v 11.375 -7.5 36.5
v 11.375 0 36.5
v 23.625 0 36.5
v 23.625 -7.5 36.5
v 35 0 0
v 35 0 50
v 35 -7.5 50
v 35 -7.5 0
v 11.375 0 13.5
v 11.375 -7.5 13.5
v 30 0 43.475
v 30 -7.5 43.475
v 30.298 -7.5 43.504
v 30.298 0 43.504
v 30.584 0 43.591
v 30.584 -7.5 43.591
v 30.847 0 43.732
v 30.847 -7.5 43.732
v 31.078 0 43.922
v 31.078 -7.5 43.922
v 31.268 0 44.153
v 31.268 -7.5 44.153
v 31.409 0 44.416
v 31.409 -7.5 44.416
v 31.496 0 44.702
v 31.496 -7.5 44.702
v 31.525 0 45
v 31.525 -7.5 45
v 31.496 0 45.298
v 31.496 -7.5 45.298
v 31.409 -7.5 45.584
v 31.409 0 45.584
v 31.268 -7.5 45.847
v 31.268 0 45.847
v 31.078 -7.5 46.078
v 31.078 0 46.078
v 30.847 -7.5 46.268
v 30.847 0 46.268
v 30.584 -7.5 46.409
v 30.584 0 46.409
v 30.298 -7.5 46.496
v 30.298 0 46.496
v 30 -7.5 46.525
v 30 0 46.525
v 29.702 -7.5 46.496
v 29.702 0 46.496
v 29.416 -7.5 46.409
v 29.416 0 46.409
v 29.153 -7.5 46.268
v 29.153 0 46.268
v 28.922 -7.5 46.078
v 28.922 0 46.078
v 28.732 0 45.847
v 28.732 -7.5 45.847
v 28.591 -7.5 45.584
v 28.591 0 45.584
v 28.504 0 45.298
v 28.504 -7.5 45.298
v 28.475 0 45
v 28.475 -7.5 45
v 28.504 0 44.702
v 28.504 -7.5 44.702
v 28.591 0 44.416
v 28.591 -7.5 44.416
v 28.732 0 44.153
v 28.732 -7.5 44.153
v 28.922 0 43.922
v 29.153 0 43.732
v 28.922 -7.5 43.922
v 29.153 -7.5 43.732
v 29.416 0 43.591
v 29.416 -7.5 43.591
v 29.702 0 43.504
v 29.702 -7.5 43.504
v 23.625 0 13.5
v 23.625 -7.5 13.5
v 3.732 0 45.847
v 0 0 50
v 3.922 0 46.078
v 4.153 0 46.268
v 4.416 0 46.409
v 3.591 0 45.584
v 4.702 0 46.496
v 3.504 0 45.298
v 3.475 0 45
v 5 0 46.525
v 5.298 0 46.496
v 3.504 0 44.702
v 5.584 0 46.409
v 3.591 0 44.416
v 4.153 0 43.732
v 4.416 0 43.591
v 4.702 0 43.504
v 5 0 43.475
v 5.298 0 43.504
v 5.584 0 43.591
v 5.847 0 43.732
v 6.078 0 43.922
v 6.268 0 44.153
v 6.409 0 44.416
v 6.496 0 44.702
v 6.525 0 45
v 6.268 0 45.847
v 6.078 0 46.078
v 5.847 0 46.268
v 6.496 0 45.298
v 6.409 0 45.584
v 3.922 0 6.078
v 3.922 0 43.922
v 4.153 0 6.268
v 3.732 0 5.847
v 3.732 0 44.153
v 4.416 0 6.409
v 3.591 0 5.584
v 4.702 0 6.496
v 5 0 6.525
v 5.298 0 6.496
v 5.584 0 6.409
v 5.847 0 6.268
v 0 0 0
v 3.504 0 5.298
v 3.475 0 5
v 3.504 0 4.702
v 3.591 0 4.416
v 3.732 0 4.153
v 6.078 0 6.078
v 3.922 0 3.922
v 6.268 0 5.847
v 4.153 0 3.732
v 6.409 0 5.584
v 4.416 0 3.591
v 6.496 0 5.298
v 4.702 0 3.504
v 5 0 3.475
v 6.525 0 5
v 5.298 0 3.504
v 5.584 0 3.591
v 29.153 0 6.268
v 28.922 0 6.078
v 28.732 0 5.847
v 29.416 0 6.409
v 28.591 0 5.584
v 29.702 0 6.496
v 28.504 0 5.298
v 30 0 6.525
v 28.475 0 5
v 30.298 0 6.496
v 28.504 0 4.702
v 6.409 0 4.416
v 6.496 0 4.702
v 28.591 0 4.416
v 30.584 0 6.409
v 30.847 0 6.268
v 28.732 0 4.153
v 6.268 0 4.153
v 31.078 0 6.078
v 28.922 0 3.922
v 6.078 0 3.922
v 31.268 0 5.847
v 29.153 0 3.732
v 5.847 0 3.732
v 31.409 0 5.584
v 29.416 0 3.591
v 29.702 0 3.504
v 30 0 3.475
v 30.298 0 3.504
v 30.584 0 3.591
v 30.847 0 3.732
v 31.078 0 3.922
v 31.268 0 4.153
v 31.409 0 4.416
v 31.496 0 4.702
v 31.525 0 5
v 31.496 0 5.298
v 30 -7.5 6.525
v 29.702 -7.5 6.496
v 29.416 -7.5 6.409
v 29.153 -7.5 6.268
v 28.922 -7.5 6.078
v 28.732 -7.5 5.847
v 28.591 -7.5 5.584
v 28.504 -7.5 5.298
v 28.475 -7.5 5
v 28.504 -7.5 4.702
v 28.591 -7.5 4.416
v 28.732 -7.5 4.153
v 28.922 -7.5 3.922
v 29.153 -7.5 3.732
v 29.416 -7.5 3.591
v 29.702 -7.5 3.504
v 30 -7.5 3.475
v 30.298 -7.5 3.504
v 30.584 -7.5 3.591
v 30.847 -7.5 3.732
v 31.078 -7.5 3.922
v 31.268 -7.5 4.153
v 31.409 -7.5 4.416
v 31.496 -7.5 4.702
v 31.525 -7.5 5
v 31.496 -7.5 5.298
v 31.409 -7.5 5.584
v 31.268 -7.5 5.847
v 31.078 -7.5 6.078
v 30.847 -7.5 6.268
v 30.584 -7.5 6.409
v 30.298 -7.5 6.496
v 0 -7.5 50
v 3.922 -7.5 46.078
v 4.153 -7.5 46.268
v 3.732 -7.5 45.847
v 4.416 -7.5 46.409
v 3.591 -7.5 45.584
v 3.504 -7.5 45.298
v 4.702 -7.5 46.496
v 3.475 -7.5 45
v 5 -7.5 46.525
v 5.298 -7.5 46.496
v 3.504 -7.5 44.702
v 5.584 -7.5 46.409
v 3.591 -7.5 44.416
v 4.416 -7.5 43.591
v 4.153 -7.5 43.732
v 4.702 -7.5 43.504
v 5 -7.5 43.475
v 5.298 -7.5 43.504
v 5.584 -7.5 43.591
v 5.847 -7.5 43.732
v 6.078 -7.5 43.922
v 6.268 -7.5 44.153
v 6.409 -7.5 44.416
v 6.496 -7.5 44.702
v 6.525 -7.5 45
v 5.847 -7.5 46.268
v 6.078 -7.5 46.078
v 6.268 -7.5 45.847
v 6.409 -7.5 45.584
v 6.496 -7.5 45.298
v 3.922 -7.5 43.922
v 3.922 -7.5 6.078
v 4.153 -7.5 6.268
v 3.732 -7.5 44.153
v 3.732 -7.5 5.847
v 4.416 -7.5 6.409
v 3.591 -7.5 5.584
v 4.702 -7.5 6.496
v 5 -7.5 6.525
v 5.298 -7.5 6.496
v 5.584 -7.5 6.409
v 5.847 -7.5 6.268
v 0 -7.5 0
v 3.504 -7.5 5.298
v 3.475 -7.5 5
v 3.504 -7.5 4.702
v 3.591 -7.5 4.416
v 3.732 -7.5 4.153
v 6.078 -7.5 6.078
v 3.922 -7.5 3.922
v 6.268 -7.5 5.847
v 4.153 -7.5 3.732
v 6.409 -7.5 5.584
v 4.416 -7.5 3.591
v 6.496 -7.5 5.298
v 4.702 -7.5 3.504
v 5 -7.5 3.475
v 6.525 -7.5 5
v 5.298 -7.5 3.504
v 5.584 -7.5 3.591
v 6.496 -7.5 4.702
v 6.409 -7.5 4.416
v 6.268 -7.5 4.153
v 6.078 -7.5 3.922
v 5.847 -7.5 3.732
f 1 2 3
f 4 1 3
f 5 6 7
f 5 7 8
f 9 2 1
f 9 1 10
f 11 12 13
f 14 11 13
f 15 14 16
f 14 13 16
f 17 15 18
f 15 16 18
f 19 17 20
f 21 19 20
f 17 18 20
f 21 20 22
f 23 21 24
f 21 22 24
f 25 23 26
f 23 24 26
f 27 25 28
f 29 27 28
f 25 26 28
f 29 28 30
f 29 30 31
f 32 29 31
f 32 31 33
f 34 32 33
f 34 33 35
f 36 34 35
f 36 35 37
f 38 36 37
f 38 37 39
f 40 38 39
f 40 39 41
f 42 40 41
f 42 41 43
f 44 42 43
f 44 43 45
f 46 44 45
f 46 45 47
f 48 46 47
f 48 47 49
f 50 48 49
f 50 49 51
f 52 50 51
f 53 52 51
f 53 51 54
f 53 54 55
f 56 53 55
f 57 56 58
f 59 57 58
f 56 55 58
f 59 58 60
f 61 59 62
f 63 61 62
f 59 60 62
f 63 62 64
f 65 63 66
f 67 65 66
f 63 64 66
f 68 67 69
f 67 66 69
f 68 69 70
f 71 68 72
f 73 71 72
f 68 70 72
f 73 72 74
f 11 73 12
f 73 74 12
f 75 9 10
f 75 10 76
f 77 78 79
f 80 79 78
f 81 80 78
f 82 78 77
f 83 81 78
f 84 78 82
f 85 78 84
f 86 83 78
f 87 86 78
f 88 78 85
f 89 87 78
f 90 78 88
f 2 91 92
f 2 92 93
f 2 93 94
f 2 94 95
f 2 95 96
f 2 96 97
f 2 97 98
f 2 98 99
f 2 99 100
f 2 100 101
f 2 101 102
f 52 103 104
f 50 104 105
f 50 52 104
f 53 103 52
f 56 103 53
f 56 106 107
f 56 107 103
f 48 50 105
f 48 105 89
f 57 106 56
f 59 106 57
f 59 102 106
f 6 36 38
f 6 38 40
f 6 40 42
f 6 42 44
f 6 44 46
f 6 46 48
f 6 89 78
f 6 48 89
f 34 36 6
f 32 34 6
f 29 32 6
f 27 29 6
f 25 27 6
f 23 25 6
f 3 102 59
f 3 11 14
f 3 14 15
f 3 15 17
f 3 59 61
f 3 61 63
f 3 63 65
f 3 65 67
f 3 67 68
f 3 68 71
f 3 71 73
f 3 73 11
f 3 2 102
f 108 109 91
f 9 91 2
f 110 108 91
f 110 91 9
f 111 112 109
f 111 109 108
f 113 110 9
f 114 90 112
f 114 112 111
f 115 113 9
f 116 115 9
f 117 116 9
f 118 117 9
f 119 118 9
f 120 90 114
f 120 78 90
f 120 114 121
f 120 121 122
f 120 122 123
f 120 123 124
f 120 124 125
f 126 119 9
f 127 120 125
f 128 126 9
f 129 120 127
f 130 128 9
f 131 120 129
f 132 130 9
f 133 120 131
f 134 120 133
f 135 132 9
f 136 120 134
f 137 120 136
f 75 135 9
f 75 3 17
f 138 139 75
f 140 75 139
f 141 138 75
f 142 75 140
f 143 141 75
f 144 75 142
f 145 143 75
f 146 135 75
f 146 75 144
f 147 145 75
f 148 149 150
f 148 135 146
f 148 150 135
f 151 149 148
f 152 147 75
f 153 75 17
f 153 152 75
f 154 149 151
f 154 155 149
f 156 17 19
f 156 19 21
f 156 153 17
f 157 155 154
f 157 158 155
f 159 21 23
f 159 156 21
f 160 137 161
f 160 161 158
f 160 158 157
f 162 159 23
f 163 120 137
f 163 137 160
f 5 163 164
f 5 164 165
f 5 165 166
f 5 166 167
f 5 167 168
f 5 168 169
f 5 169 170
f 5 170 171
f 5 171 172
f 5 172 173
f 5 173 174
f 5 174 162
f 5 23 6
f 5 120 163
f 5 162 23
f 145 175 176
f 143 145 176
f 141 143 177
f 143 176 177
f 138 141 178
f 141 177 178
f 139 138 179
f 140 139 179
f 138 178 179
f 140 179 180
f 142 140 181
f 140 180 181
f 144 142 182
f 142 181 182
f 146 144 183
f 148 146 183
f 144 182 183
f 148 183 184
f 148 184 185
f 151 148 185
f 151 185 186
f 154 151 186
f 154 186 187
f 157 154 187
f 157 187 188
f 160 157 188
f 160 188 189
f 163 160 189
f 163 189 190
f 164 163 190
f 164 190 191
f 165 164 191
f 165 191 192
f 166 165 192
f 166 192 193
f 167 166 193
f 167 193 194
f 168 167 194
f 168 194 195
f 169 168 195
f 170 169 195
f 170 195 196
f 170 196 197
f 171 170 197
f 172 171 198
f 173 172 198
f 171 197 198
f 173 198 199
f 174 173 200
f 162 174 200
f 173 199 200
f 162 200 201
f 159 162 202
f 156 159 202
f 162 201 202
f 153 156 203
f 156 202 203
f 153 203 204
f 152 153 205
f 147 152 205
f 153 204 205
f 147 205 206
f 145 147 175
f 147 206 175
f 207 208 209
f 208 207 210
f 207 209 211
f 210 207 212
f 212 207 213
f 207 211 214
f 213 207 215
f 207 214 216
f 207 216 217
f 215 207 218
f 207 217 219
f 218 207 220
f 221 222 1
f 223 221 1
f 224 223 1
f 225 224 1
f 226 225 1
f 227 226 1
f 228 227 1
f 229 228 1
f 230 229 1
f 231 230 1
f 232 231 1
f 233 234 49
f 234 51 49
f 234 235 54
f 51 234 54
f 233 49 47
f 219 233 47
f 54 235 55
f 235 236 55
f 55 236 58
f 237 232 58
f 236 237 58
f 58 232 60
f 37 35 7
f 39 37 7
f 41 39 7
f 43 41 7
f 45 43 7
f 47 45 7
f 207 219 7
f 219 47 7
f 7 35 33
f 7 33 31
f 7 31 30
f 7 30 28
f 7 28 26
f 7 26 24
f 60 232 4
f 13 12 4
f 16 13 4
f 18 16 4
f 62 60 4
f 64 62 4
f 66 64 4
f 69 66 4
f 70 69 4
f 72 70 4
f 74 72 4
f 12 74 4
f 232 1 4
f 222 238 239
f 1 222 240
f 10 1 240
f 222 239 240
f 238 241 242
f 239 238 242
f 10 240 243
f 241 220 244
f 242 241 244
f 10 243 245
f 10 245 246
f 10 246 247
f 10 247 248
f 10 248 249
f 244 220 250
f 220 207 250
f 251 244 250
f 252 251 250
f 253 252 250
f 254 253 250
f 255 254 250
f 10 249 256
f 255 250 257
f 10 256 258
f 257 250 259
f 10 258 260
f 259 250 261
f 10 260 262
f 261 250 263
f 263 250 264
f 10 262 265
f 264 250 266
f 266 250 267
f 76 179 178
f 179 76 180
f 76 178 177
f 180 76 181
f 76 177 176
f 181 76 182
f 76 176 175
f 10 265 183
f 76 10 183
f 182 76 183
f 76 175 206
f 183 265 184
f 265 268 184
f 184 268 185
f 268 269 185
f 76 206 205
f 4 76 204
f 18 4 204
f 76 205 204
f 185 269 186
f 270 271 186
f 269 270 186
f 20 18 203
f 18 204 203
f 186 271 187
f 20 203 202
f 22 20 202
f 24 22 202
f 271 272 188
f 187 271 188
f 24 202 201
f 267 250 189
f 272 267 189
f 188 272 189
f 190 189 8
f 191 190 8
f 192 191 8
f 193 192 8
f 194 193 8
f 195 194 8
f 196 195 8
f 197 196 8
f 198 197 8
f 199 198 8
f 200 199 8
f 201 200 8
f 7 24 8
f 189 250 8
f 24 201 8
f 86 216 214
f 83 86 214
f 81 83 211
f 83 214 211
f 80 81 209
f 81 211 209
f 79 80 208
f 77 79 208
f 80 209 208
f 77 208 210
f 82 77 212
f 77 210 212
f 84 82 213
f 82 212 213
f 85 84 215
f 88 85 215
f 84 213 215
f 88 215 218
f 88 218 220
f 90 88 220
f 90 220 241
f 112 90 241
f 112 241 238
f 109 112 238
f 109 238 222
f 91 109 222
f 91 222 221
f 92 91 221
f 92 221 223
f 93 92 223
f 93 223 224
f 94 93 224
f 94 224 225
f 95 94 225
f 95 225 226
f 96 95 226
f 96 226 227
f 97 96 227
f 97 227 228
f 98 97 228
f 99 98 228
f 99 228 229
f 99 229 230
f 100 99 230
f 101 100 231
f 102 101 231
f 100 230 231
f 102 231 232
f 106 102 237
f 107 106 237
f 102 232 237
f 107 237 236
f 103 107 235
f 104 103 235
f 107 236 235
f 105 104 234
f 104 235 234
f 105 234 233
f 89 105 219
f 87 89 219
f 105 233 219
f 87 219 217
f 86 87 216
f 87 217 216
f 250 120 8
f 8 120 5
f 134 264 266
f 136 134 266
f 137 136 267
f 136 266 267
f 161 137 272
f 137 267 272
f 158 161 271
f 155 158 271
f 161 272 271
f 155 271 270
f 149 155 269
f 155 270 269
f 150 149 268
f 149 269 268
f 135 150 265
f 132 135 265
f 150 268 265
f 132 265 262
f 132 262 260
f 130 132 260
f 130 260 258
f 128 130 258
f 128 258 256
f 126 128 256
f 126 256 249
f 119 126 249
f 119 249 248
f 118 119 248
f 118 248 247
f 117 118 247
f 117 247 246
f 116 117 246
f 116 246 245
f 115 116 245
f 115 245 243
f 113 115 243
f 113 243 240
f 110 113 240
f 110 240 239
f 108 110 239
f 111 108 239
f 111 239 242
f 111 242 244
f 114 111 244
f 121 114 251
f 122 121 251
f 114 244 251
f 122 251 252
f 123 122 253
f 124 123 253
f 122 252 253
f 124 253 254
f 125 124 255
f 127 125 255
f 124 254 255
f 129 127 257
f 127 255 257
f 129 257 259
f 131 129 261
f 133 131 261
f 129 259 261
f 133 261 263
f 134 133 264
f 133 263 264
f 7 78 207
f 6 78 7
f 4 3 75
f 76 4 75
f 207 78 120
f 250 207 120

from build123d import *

# Parameters (mm, degrees)
SKETCH_1_W          = 35
SKETCH_1_H          = 50
SKETCH_1_W_2        = 12.25
SKETCH_1_H_2        = 23
EXTRUDE_2_DEPTH     = 7.5
SKETCH_2_R          = 1.525
CUT_EXTRUDE_1_DEPTH = 62.491869381


with BuildPart() as part:
    # 草图1 → 凸台-拉伸2 (new body)
    with BuildSketch(Plane(origin=(0, 0, 0), x_dir=(1, 0, 0), z_dir=(0, 1, 0))):
        with Locations((17.5, -25)):
            Rectangle(SKETCH_1_W, SKETCH_1_H)
        with Locations((17.5, -25)):
            Rectangle(SKETCH_1_W_2, SKETCH_1_H_2, mode=Mode.SUBTRACT)
    extrude(amount=-EXTRUDE_2_DEPTH)

    # 草图2 → 切除-拉伸1 (cut, through all)
    with BuildSketch(Plane.XZ.offset(7.5)):
        with Locations(Location((5, 5, 0), (0, 0, 270))):
            Circle(SKETCH_2_R)
        with Locations(Location((5, 45, 0), (0, 0, 90))):
            Circle(SKETCH_2_R)
        with Locations(Location((30, 45, 0), (0, 0, 270))):
            Circle(SKETCH_2_R)
        with Locations(Location((30, 5, 0), (0, 0, 90))):
            Circle(SKETCH_2_R)
    extrude(amount=-CUT_EXTRUDE_1_DEPTH, mode=Mode.SUBTRACT)


solid = part.part
